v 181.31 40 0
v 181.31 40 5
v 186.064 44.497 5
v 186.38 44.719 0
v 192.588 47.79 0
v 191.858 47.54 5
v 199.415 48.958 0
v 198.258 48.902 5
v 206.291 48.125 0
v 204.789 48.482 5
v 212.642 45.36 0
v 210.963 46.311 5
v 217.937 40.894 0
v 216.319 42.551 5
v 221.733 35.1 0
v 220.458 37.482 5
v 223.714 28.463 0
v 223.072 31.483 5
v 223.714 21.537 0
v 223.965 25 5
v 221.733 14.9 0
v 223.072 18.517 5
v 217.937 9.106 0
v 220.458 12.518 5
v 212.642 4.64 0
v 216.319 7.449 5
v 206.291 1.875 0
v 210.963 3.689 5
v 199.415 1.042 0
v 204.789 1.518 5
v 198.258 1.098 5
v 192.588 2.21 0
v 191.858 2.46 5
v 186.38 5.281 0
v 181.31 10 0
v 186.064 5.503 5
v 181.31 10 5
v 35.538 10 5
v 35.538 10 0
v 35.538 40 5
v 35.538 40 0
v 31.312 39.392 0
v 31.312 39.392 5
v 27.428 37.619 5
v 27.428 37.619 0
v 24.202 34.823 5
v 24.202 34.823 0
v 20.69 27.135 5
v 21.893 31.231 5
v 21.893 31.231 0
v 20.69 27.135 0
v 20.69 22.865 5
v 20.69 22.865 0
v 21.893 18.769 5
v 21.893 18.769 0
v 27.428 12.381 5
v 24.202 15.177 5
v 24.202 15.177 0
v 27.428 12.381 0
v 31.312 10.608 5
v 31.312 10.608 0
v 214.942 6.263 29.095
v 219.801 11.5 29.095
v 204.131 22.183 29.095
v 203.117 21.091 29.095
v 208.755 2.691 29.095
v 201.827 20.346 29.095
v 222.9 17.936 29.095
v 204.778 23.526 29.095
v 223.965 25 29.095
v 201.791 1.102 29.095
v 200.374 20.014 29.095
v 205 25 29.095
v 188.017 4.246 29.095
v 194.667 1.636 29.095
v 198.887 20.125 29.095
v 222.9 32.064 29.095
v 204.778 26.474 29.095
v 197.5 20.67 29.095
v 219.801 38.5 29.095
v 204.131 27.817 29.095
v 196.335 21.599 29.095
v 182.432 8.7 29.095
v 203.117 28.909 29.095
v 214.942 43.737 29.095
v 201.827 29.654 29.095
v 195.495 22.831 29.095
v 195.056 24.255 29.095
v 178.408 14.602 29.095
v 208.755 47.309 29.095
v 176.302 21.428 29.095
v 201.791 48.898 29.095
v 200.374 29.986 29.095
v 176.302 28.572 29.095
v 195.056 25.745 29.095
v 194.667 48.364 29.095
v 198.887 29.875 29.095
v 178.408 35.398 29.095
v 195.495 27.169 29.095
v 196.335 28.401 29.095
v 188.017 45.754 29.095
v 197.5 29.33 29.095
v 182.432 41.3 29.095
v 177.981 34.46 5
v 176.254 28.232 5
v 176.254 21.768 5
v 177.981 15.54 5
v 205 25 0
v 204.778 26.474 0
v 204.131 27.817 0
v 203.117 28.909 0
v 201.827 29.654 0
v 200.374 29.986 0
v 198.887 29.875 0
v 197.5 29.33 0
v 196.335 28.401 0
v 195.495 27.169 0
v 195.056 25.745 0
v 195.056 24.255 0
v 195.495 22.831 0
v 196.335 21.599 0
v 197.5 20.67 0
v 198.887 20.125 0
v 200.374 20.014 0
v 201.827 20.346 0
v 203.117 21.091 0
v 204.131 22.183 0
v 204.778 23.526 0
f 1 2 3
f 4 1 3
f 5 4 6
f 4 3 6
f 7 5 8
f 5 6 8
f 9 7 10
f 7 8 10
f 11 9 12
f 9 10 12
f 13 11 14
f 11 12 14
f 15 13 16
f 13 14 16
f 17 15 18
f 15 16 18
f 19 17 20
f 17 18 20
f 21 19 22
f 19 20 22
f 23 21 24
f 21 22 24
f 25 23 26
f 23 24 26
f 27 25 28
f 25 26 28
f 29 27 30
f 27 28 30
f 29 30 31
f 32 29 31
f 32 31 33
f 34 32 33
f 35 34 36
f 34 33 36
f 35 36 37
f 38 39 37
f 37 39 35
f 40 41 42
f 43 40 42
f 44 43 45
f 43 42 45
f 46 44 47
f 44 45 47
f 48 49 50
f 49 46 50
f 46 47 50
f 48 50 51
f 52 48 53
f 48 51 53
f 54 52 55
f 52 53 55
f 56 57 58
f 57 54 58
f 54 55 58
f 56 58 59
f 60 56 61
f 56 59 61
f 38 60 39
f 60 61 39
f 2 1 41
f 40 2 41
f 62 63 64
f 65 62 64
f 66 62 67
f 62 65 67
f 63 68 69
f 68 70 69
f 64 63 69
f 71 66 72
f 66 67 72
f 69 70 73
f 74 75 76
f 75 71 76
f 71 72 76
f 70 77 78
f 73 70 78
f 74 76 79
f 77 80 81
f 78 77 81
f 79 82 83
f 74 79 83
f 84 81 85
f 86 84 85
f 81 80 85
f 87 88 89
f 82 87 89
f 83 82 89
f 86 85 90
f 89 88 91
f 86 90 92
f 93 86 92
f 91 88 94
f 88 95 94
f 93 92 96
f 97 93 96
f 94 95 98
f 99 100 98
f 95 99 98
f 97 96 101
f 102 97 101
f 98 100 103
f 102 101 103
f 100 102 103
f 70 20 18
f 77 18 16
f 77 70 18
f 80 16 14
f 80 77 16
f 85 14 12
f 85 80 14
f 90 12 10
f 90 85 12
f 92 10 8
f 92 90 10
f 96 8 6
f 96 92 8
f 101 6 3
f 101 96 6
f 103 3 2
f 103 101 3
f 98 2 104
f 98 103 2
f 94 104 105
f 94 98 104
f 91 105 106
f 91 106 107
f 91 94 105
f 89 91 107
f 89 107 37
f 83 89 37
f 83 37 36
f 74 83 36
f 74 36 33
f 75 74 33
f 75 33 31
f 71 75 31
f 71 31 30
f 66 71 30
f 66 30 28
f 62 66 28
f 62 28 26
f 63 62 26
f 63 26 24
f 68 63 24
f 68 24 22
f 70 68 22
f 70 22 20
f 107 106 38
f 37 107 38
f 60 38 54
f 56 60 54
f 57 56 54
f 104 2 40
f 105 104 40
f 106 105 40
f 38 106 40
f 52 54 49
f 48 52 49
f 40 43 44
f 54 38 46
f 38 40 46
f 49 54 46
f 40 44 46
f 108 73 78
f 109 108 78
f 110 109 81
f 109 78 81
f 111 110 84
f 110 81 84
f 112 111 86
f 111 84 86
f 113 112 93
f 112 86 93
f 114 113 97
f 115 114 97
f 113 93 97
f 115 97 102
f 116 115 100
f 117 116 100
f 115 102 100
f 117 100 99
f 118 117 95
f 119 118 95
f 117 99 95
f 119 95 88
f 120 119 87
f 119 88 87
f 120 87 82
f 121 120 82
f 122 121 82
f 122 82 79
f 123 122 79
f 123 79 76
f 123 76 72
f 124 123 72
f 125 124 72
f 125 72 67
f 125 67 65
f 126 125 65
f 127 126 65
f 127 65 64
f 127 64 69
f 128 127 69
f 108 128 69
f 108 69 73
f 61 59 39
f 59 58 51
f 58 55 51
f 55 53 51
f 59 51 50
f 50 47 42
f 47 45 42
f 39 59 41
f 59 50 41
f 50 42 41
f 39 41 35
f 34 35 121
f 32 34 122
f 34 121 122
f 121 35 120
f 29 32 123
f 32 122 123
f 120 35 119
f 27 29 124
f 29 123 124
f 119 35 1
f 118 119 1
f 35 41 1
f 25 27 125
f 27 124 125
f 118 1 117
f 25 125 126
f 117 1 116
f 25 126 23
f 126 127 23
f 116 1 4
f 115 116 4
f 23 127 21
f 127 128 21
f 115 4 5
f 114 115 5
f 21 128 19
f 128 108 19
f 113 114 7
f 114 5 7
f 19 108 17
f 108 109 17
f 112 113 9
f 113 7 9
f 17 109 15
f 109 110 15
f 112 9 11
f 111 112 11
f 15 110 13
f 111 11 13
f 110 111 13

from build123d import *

# Parameters (mm, degrees)
SKETCH1_W           = 50
SKETCH1_H           = 50
BOSS_EXTRUDE1_DEPTH = 50
SKETCH2_W           = 50
SKETCH2_H           = 30
CUT_EXTRUDE1_DEPTH  = 5
SKETCH3_W           = 5
SKETCH3_H           = 30
BOSS_EXTRUDE2_DEPTH = 150
SKETCH4_R           = 35
BOSS_EXTRUDE3_DEPTH = 50
SKETCH5_OUTSIDE_W   = 287.05
SKETCH5_OUTSIDE_H   = 122.05
CUT_EXTRUDE2_DEPTH  = 60
SKETCH6_OUTSIDE_W   = 262.676
SKETCH6_OUTSIDE_H   = 98.214
CUT_EXTRUDE3_DEPTH  = 60
SKETCH7_R           = 5
CUT_EXTRUDE4_DEPTH  = 60
SKETCH8_OUTSIDE_W   = 262.676
SKETCH8_OUTSIDE_H   = 118.214
SKETCH8_OUTSIDE_R   = 23.965206127
CUT_EXTRUDE5_DEPTH  = 45
SKETCH9_OUTSIDE_W   = 262.676
SKETCH9_OUTSIDE_H   = 118.214
CUT_EXTRUDE6_DEPTH  = 47
CUT_EXTRUDE7_DEPTH  = 48.5


with BuildPart() as part:
    # Sketch1 → Boss-Extrude1 (new body)
    with BuildSketch(Plane.XY):
        with Locations((25, 25)):
            Rectangle(SKETCH1_W, SKETCH1_H)
    extrude(amount=BOSS_EXTRUDE1_DEPTH)

    # Sketch2 → Cut-Extrude1 (cut)
    with BuildSketch(Plane.XY.offset(50)):
        with Locations((25, 25)):
            Rectangle(SKETCH2_W, SKETCH2_H)
    extrude(amount=-CUT_EXTRUDE1_DEPTH, mode=Mode.SUBTRACT)

    # Sketch3 → Boss-Extrude2 (add)
    with BuildSketch(Plane(origin=(50, 0, 0), x_dir=(0, 0, -1), z_dir=(1, 0, 0))):
        with Locations((-2.5, 25)):
            Rectangle(SKETCH3_W, SKETCH3_H)
    extrude(amount=BOSS_EXTRUDE2_DEPTH)

    # Sketch4 → Boss-Extrude3 (add)
    with BuildSketch(Plane(origin=(0, 0, 0), x_dir=(-1, 0, 0), z_dir=(0, 0, -1))):
        with Locations((-200, 25)):
            Circle(SKETCH4_R)
    extrude(amount=-BOSS_EXTRUDE3_DEPTH)

    # Sketch5 outside → Cut-Extrude2 (cut)
    with BuildSketch(Plane(origin=(0, 0, 0), x_dir=(-1, 0, 0), z_dir=(0, 0, -1))):
        with Locations((-117.5, 25)):
            Rectangle(SKETCH5_OUTSIDE_W, SKETCH5_OUTSIDE_H)
        with BuildLine():
            Line((-50, 40), (-35.53775066, 40))
            ThreePointArc((-35.53775066, 40), (-20.53775066, 25), (-35.53775066, 10))
            Line((-35.53775066, 10), (-50, 10))
            Line((-50, 10), (-247.49593965, -30.086255952))
            Line((-247.49593965, -30.086255952), (-247.49593965, 85.804552417))
            Line((-247.49593965, 85.804552417), (-50, 40))
        make_face(mode=Mode.SUBTRACT)
    extrude(amount=-CUT_EXTRUDE2_DEPTH, mode=Mode.SUBTRACT)

    # Sketch6 outside → Cut-Extrude3 (cut)
    with BuildSketch(Plane(origin=(0, 40, 0), x_dir=(1, 0, 0), z_dir=(0, 1, 0))):
        with Locations((127.769, -25)):
            Rectangle(SKETCH6_OUTSIDE_W, SKETCH6_OUTSIDE_H)
        Polygon((50, -5), (20.53775066, -5), (20.53775066, 0), (245.971060593, 0), (245.971060593, -81.039305363), (133.254405627, -81.039305363), align=None, mode=Mode.SUBTRACT)
    extrude(amount=-CUT_EXTRUDE3_DEPTH, mode=Mode.SUBTRACT)

    # Sketch7 → Cut-Extrude4 (cut)
    with BuildSketch(Plane.XY.offset(50)):
        with Locations((200, 25)):
            Circle(SKETCH7_R)
    extrude(amount=-CUT_EXTRUDE4_DEPTH, mode=Mode.SUBTRACT)

    # Sketch8 outside → Cut-Extrude5 (cut)
    with BuildSketch(Plane.XY.offset(50)):
        with Locations((127.769, 25)):
            Rectangle(SKETCH8_OUTSIDE_W, SKETCH8_OUTSIDE_H)
        with Locations((200, 25)):
            Circle(SKETCH8_OUTSIDE_R, mode=Mode.SUBTRACT)
    extrude(amount=-CUT_EXTRUDE5_DEPTH, mode=Mode.SUBTRACT)

    # Sketch9 outside → Cut-Extrude6 (cut)
    with BuildSketch(Plane.XY.offset(5)):
        with Locations((127.769, 25)):
            Rectangle(SKETCH9_OUTSIDE_W, SKETCH9_OUTSIDE_H)
        with BuildLine():
            Line((168.377223398, 40), (181.309598594, 40))
            ThreePointArc((181.309598594, 40), (223.965206127, 25), (181.309598594, 10))
            Line((181.309598594, 10), (168.377223398, 10))
            Line((168.377223398, 10), (164.401061703, 1.034793873))
            Line((164.401061703, 1.034793873), (16.874562841, 1.034793873))
            Line((16.874562841, 1.034793873), (16.874562841, 40))
            Line((16.874562841, 40), (168.377223398, 40))
        make_face(mode=Mode.SUBTRACT)
    extrude(amount=-CUT_EXTRUDE6_DEPTH, mode=Mode.SUBTRACT)

    # Sketch10 → Cut-Extrude7 (cut, symmetric)
    with BuildSketch(Plane(origin=(0, 40, 0), x_dir=(1, 0, 0), z_dir=(0, 1, 0))):
        Polygon((232.409731391, -29.094811743), (165.185777122, -29.094811743), (165.185777122, -67.022723685), (235.548593069, -67.022723685), align=None)
    extrude(amount=CUT_EXTRUDE7_DEPTH, both=True, mode=Mode.SUBTRACT)


solid = part.part
